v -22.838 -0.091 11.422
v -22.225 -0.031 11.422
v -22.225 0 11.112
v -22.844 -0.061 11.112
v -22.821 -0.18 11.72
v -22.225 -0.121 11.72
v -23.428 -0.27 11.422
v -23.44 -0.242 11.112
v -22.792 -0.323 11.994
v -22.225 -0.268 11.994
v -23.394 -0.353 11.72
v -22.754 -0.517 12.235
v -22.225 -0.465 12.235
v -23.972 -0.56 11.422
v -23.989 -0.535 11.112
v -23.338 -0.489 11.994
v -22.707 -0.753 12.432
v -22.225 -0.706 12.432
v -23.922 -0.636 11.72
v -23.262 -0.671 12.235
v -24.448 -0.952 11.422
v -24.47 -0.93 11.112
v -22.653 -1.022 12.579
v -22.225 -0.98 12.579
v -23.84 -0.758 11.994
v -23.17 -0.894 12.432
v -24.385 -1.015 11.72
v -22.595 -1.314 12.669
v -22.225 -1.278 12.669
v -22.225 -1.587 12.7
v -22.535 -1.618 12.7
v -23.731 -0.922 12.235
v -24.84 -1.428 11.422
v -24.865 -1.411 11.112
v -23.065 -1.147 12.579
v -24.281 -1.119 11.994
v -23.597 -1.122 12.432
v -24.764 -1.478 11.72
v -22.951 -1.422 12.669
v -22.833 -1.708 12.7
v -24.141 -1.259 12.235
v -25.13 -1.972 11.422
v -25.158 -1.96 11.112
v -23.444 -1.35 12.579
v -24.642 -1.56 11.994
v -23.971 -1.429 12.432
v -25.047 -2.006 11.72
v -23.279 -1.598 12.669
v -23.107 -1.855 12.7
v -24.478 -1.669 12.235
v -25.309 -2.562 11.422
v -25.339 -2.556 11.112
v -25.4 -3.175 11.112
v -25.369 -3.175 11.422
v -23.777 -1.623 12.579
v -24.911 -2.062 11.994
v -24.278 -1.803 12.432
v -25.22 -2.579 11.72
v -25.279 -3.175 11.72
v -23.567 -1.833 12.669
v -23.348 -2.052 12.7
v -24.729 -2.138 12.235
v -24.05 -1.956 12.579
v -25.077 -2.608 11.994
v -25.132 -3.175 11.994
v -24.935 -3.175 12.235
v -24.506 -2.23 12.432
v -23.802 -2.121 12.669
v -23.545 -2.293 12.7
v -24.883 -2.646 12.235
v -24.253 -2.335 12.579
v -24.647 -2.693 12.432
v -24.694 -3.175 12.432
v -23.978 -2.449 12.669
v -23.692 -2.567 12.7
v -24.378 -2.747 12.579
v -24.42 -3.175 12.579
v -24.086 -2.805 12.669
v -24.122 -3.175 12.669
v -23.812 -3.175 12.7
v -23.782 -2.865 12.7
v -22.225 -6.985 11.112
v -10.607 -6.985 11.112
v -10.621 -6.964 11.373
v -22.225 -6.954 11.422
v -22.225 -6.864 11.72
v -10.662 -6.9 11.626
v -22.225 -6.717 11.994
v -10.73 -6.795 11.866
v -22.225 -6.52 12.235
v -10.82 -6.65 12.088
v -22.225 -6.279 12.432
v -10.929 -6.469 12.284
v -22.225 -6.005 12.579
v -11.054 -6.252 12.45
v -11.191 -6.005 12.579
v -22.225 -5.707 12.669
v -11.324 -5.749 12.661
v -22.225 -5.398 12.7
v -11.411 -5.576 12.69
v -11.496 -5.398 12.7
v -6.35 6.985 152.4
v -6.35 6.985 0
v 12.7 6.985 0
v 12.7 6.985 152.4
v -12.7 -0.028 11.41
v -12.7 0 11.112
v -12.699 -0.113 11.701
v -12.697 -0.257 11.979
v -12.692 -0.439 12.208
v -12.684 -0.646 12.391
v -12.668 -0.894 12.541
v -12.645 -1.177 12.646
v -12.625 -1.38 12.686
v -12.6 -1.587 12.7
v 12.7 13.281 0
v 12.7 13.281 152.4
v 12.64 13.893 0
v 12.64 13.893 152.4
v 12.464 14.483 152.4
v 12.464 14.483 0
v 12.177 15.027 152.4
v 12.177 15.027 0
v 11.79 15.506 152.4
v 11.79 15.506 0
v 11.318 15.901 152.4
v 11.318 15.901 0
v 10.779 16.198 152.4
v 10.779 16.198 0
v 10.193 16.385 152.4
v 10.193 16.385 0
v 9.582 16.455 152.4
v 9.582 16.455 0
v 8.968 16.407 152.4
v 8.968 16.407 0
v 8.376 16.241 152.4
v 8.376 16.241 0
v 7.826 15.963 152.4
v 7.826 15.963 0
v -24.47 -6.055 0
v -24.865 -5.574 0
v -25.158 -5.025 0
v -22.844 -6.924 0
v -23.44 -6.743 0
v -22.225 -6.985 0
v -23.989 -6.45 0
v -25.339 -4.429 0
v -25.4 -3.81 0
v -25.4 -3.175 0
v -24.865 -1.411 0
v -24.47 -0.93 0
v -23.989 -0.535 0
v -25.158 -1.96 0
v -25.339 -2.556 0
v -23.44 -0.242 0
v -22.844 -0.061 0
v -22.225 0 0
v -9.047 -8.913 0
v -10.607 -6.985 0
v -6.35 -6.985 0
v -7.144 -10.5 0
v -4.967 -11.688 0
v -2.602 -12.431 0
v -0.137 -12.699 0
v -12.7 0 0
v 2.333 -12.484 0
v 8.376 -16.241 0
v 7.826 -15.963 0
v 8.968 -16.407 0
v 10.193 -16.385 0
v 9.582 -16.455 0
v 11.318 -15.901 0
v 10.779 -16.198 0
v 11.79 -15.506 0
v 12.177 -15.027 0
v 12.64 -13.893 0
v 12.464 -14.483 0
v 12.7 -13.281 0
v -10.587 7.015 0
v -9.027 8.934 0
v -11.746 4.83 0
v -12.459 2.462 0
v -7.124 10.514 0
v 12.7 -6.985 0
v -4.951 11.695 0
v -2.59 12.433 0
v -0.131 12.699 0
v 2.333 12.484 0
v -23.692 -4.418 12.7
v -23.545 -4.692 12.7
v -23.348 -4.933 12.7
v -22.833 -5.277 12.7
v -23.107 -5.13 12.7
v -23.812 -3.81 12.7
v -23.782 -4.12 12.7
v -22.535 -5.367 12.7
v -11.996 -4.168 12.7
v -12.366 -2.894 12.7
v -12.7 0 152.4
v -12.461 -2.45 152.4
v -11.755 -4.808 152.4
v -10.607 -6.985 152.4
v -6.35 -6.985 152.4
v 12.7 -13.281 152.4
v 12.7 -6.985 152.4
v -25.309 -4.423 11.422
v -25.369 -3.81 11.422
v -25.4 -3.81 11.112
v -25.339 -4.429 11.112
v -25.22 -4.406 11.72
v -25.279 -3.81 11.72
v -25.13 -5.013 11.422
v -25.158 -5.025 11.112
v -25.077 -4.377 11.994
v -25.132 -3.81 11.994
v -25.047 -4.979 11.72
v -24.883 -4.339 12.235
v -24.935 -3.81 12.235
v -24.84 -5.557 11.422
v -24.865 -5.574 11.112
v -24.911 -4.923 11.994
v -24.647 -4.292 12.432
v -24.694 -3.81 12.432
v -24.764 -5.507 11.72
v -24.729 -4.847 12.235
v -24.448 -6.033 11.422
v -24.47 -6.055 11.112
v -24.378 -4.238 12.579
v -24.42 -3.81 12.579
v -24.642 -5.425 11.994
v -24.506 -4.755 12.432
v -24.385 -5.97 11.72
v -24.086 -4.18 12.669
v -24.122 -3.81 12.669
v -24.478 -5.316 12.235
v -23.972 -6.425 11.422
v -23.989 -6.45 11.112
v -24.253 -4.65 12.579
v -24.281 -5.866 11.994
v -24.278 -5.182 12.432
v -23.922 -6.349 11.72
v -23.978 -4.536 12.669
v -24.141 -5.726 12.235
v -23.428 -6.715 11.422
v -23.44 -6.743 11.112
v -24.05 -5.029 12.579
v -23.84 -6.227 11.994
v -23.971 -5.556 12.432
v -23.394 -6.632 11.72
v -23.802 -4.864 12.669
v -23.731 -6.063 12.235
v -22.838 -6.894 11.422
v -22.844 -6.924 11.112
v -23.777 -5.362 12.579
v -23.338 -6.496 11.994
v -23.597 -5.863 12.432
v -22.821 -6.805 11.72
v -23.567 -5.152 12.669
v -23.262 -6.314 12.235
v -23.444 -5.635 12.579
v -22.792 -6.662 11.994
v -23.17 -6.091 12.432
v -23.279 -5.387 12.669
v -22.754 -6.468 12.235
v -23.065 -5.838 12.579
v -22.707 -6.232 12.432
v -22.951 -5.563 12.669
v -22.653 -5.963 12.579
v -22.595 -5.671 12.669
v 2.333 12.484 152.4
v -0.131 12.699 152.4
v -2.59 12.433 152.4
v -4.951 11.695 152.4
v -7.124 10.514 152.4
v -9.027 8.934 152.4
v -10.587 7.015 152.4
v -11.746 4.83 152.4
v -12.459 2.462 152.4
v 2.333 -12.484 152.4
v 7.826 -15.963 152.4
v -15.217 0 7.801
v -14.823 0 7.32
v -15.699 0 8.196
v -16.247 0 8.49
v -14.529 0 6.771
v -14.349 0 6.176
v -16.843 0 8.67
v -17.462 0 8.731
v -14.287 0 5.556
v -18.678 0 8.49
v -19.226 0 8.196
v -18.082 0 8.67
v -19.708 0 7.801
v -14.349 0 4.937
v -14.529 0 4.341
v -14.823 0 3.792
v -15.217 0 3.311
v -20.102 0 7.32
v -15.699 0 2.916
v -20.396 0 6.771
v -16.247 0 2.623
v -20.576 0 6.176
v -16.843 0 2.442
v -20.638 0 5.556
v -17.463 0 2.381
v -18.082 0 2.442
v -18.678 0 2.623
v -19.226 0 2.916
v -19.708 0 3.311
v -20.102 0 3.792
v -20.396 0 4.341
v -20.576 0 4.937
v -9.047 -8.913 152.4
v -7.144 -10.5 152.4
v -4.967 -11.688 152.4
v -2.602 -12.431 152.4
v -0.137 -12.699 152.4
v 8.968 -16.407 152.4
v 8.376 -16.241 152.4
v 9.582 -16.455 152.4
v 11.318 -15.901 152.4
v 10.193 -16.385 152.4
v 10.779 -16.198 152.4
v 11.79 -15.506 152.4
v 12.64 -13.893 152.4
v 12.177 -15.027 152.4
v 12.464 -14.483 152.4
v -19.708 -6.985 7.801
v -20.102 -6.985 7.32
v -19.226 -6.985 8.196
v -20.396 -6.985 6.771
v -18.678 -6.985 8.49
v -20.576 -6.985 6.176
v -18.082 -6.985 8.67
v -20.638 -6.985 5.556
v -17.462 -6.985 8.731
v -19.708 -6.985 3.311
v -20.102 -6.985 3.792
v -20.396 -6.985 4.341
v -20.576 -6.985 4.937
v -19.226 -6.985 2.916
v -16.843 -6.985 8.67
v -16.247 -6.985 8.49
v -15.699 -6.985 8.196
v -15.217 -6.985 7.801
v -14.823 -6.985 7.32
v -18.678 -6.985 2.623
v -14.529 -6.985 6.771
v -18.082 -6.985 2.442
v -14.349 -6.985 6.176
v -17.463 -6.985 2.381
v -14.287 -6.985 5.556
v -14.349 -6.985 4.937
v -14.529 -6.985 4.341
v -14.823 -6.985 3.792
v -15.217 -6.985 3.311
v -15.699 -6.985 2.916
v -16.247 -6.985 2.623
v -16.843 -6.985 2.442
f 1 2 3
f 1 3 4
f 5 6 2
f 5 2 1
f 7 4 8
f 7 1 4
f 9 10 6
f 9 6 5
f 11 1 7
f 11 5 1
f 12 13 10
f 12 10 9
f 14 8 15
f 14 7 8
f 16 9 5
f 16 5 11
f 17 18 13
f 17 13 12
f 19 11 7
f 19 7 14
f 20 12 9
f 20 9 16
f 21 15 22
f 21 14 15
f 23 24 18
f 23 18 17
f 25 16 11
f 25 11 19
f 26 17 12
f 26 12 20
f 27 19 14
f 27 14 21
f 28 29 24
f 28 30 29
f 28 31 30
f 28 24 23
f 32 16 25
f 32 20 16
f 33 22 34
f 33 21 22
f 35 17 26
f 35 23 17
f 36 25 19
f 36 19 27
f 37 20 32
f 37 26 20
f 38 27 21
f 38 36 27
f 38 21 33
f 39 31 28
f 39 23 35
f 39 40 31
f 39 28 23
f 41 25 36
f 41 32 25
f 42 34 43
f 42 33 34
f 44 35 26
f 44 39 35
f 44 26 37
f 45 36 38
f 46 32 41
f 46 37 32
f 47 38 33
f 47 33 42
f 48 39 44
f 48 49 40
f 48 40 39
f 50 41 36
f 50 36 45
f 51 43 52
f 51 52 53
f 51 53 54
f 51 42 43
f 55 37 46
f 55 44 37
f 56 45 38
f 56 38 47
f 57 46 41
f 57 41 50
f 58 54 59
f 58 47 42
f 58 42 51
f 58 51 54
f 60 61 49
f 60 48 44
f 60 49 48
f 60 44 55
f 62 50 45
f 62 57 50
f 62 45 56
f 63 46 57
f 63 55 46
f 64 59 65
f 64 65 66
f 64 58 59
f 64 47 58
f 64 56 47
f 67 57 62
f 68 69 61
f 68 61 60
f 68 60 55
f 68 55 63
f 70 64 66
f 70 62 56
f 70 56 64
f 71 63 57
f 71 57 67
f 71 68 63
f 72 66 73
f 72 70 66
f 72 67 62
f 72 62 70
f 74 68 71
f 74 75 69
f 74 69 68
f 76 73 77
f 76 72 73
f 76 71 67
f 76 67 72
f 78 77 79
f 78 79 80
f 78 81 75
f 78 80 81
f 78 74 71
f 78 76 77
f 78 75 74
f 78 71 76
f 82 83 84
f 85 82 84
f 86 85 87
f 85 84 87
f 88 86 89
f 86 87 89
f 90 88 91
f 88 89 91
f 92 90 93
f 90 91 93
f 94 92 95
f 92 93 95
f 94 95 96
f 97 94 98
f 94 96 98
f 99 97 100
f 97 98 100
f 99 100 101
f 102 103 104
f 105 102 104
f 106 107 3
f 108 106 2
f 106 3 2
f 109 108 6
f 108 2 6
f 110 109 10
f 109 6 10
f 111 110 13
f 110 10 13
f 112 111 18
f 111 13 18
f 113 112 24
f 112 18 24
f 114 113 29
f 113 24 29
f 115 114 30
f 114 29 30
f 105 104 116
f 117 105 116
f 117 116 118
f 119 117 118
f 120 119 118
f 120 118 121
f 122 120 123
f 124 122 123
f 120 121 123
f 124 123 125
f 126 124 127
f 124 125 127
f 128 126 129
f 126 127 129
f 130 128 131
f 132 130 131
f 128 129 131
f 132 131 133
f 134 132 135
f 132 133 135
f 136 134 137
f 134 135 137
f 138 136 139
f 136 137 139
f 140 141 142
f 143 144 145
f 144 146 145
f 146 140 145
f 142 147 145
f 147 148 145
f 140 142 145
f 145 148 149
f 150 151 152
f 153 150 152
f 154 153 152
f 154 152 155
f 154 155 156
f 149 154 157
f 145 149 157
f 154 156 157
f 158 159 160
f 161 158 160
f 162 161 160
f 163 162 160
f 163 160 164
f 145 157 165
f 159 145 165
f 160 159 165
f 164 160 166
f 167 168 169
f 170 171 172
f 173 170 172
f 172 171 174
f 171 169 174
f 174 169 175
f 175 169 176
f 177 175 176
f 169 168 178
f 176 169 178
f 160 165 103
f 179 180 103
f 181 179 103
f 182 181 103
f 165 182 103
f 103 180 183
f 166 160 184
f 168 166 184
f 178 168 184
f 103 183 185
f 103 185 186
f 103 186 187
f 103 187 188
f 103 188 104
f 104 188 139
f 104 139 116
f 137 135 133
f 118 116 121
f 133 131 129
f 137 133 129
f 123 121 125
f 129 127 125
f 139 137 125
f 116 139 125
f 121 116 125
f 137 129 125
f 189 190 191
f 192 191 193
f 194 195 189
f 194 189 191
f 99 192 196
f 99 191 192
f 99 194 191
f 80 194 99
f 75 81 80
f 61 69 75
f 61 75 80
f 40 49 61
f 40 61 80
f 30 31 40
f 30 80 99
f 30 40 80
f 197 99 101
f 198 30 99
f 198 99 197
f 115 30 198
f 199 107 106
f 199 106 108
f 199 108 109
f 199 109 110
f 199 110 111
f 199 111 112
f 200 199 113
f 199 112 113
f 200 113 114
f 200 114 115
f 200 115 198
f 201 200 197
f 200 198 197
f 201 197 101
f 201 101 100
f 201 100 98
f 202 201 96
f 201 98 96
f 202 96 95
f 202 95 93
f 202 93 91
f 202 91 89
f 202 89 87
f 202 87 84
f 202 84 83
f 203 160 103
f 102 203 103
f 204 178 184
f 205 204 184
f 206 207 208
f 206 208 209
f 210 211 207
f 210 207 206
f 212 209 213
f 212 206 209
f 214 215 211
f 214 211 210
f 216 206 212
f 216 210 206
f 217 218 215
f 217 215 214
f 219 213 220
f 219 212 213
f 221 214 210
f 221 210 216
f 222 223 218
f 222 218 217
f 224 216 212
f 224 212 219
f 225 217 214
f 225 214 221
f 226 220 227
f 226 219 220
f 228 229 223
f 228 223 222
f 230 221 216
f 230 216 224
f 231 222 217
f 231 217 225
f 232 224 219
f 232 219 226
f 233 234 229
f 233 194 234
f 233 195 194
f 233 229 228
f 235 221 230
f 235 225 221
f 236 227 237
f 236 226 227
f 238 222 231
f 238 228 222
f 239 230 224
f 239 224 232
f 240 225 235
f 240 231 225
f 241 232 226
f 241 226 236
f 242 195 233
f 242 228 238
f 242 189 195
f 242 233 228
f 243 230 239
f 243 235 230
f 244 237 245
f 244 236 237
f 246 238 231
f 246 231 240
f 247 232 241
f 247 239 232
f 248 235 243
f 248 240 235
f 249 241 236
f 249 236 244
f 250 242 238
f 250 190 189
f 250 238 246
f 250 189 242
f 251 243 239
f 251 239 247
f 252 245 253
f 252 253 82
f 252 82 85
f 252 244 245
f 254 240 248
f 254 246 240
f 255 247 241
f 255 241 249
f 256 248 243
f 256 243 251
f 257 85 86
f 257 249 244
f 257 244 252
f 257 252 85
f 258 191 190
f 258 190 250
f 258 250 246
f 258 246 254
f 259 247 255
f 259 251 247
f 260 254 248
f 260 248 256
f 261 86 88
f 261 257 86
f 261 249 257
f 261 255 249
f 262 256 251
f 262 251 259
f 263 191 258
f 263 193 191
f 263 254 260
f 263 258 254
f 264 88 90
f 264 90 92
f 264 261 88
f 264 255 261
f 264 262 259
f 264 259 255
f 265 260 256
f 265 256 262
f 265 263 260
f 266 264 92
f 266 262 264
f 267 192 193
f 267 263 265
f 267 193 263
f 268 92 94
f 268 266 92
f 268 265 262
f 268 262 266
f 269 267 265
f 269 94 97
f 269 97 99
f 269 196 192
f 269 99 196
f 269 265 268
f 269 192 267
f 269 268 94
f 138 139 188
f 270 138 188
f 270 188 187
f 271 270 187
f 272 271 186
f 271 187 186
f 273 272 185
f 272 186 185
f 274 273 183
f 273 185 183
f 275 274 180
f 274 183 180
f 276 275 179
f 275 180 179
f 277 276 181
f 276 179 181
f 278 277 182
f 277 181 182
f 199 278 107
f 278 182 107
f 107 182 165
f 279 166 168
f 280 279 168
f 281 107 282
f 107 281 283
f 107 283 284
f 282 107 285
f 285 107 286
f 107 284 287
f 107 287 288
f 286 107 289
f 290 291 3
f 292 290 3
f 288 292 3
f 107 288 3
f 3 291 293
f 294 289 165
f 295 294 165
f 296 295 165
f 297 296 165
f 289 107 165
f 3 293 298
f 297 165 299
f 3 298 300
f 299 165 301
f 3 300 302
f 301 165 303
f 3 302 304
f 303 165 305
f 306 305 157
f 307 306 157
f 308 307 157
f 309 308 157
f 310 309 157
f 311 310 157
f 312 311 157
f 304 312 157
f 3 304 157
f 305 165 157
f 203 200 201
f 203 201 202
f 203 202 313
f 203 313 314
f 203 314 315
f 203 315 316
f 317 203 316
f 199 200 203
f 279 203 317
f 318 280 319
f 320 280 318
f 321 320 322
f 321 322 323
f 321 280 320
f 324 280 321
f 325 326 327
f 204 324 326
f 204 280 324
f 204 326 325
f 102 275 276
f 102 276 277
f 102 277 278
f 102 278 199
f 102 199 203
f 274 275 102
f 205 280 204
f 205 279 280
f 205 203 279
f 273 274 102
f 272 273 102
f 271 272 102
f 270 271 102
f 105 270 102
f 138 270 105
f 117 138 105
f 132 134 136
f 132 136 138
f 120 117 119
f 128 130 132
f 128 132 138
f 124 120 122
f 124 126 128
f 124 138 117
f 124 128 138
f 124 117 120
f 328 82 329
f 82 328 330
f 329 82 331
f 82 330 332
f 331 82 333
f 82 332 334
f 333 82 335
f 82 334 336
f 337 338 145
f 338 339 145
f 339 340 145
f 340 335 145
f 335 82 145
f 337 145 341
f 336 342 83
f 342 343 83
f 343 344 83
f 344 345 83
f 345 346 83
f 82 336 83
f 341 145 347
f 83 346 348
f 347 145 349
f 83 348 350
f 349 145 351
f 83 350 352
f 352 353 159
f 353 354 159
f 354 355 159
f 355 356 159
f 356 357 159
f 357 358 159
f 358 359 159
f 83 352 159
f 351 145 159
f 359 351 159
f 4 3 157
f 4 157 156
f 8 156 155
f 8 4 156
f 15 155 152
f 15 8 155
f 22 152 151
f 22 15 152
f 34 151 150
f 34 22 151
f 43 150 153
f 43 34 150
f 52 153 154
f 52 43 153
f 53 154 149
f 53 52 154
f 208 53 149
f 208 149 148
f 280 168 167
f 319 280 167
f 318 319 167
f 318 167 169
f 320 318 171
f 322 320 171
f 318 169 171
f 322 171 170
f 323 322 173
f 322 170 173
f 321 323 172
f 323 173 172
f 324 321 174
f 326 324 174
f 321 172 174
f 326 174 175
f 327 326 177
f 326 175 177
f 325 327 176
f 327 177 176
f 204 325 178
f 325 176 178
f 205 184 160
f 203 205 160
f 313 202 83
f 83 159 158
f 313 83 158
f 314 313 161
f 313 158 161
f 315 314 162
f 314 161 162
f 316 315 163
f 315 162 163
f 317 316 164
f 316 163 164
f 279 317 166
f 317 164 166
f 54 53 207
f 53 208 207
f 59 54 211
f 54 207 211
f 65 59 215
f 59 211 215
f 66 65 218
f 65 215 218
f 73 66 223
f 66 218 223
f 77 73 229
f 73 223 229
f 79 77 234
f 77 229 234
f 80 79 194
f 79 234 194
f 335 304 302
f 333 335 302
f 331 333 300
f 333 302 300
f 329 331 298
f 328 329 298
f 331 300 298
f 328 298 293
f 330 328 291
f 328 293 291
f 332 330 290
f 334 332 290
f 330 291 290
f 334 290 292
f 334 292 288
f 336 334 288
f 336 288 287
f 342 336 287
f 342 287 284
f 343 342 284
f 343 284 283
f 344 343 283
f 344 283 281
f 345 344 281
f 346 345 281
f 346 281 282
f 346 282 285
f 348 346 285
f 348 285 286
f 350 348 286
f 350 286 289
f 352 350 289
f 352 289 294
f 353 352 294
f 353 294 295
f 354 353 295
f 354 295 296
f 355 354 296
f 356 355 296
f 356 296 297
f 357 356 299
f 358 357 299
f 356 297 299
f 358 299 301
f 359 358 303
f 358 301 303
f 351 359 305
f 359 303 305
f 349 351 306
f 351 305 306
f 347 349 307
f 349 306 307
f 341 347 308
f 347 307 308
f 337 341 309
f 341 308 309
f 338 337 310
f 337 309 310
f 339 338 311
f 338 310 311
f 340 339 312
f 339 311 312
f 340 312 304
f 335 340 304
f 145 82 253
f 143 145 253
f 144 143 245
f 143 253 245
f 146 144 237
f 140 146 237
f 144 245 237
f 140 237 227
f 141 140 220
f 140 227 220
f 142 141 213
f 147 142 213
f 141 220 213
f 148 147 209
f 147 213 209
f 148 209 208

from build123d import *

# Parameters (mm, degrees)
F1_DEPTH = 152.4
F2_DEPTH = 12.7
F3_R     = 3.175
F4_R     = 1.5875
F5_R     = 3.175
F6_DEPTH = 25.4


# Not quite as in the source:
# - a feature names something its author has since deleted; it is built from what else it names


with BuildPart() as f1:
    # F0 (on Top) → F1 (new body)
    with BuildSketch(Plane.XY):
        with BuildLine():
            Line((-6.35, 6.985), (10.6065911112, 6.985))
            ThreePointArc((10.6065911112, 6.985), (7.0295838714, 10.5770955652), (2.33256194, 12.4839558953))
            Line((2.33256194, 12.4839558953), (-6.35, 6.985))
        make_face()
        with BuildLine():
            ThreePointArc((2.33256194, 12.4839558953), (7.0295838714, 10.5770955652), (10.6065911112, 6.985))
            Line((10.6065911112, 6.985), (12.7, 6.985))
            Line((12.7, 6.985), (12.7, 13.2809655419))
            ThreePointArc((12.7, 13.2809655419), (11.0558438219, 16.0625374343), (7.8262096422, 15.9632661068))
            Line((7.8262096422, 15.9632661068), (2.33256194, 12.4839558953))
        make_face()
        with BuildLine():
            Line((12.7, -6.985), (10.6065911112, -6.985))
            ThreePointArc((10.6065911112, -6.985), (7.0295838714, -10.5770955652), (2.33256194, -12.4839558953))
            Line((2.33256194, -12.4839558953), (7.8262096422, -15.9632661068))
            ThreePointArc((7.8262096422, -15.9632661068), (11.0558438219, -16.0625374343), (12.7, -13.2809655419))
            Line((12.7, -13.2809655419), (12.7, -6.985))
        make_face()
        with BuildLine():
            ThreePointArc((2.33256194, -12.4839558953), (7.0295838714, -10.5770955652), (10.6065911112, -6.985))
            Line((10.6065911112, -6.985), (0, -6.985))
            Line((0, -6.985), (-6.35, -6.985))
            Line((-6.35, -6.985), (2.33256194, -12.4839558953))
        make_face()
        with BuildLine():
            Line((-6.35, 6.985), (2.33256194, 12.4839558953))
            ThreePointArc((2.33256194, 12.4839558953), (-8.1137680323, 9.7701979672), (-12.7, 0))
            Line((-12.7, 0), (-6.35, 0))
            Line((-6.35, 0), (-6.35, 6.985))
        make_face()
        with BuildLine():
            ThreePointArc((-10.6065911112, -6.985), (-4.9673452332, -11.6882625456), (2.33256194, -12.4839558953))
            Line((2.33256194, -12.4839558953), (-6.35, -6.985))
            Line((-6.35, -6.985), (-10.6065911112, -6.985))
        make_face()
        with BuildLine():
            Line((-6.35, 0), (-12.7, 0))
            ThreePointArc((-12.7, 0), (-12.1653957419, -3.6459767476), (-10.6065911112, -6.985))
            Line((-10.6065911112, -6.985), (-6.35, -6.985))
            Line((-6.35, -6.985), (-6.35, 0))
        make_face()
    extrude(amount=F1_DEPTH)

    # F0 (on Top) → F2 (join)
    with BuildSketch(Plane.XY):
        with BuildLine():
            Line((-6.35, 0), (-12.7, 0))
            ThreePointArc((-12.7, 0), (-12.1653957419, -3.6459767476), (-10.6065911112, -6.985))
            Line((-10.6065911112, -6.985), (-6.35, -6.985))
            Line((-6.35, -6.985), (-6.35, 0))
        make_face()
        with BuildLine():
            Line((-6.35, 6.985), (2.33256194, 12.4839558953))
            ThreePointArc((2.33256194, 12.4839558953), (-8.1137680323, 9.7701979672), (-12.7, 0))
            Line((-12.7, 0), (-6.35, 0))
            Line((-6.35, 0), (-6.35, 6.985))
        make_face()
        with BuildLine():
            ThreePointArc((-10.6065911112, -6.985), (-12.1653957419, -3.6459767476), (-12.7, 0))
            Line((-12.7, 0), (-25.4, 0))
            Line((-25.4, 0), (-25.4, -6.985))
            Line((-25.4, -6.985), (-10.6065911112, -6.985))
        make_face()
    extrude(amount=F2_DEPTH)

    # F3
    f3_edges = [f1.edges().sort_by_distance(p)[0] for p in [
        (-25.4, 0, 6.35),
        (-25.4, -6.985, 6.35),
    ]]
    fillet(f3_edges, radius=F3_R)

    # F4
    f4_edges = [f1.edges().sort_by_distance(p)[0] for p in [
        (-17.4625, 0, 12.7),
        (-24.470064, -0.929936, 12.7),
        (-25.4, -3.4925, 12.7),
        (-24.470064, -6.055064, 12.7),
        (-16.415796, -6.985, 12.7),
    ]]
    fillet(f4_edges, radius=F4_R)

    # F5 (on face) → F6 (cut)
    with BuildSketch(Plane(origin=(0, 0, 0), x_dir=(-1, 0, 0), z_dir=(0, 1, 0))):
        with Locations((17.4625, 5.55625)):
            Circle(F5_R)
    extrude(amount=-F6_DEPTH, mode=Mode.SUBTRACT)


solid = f1.part
